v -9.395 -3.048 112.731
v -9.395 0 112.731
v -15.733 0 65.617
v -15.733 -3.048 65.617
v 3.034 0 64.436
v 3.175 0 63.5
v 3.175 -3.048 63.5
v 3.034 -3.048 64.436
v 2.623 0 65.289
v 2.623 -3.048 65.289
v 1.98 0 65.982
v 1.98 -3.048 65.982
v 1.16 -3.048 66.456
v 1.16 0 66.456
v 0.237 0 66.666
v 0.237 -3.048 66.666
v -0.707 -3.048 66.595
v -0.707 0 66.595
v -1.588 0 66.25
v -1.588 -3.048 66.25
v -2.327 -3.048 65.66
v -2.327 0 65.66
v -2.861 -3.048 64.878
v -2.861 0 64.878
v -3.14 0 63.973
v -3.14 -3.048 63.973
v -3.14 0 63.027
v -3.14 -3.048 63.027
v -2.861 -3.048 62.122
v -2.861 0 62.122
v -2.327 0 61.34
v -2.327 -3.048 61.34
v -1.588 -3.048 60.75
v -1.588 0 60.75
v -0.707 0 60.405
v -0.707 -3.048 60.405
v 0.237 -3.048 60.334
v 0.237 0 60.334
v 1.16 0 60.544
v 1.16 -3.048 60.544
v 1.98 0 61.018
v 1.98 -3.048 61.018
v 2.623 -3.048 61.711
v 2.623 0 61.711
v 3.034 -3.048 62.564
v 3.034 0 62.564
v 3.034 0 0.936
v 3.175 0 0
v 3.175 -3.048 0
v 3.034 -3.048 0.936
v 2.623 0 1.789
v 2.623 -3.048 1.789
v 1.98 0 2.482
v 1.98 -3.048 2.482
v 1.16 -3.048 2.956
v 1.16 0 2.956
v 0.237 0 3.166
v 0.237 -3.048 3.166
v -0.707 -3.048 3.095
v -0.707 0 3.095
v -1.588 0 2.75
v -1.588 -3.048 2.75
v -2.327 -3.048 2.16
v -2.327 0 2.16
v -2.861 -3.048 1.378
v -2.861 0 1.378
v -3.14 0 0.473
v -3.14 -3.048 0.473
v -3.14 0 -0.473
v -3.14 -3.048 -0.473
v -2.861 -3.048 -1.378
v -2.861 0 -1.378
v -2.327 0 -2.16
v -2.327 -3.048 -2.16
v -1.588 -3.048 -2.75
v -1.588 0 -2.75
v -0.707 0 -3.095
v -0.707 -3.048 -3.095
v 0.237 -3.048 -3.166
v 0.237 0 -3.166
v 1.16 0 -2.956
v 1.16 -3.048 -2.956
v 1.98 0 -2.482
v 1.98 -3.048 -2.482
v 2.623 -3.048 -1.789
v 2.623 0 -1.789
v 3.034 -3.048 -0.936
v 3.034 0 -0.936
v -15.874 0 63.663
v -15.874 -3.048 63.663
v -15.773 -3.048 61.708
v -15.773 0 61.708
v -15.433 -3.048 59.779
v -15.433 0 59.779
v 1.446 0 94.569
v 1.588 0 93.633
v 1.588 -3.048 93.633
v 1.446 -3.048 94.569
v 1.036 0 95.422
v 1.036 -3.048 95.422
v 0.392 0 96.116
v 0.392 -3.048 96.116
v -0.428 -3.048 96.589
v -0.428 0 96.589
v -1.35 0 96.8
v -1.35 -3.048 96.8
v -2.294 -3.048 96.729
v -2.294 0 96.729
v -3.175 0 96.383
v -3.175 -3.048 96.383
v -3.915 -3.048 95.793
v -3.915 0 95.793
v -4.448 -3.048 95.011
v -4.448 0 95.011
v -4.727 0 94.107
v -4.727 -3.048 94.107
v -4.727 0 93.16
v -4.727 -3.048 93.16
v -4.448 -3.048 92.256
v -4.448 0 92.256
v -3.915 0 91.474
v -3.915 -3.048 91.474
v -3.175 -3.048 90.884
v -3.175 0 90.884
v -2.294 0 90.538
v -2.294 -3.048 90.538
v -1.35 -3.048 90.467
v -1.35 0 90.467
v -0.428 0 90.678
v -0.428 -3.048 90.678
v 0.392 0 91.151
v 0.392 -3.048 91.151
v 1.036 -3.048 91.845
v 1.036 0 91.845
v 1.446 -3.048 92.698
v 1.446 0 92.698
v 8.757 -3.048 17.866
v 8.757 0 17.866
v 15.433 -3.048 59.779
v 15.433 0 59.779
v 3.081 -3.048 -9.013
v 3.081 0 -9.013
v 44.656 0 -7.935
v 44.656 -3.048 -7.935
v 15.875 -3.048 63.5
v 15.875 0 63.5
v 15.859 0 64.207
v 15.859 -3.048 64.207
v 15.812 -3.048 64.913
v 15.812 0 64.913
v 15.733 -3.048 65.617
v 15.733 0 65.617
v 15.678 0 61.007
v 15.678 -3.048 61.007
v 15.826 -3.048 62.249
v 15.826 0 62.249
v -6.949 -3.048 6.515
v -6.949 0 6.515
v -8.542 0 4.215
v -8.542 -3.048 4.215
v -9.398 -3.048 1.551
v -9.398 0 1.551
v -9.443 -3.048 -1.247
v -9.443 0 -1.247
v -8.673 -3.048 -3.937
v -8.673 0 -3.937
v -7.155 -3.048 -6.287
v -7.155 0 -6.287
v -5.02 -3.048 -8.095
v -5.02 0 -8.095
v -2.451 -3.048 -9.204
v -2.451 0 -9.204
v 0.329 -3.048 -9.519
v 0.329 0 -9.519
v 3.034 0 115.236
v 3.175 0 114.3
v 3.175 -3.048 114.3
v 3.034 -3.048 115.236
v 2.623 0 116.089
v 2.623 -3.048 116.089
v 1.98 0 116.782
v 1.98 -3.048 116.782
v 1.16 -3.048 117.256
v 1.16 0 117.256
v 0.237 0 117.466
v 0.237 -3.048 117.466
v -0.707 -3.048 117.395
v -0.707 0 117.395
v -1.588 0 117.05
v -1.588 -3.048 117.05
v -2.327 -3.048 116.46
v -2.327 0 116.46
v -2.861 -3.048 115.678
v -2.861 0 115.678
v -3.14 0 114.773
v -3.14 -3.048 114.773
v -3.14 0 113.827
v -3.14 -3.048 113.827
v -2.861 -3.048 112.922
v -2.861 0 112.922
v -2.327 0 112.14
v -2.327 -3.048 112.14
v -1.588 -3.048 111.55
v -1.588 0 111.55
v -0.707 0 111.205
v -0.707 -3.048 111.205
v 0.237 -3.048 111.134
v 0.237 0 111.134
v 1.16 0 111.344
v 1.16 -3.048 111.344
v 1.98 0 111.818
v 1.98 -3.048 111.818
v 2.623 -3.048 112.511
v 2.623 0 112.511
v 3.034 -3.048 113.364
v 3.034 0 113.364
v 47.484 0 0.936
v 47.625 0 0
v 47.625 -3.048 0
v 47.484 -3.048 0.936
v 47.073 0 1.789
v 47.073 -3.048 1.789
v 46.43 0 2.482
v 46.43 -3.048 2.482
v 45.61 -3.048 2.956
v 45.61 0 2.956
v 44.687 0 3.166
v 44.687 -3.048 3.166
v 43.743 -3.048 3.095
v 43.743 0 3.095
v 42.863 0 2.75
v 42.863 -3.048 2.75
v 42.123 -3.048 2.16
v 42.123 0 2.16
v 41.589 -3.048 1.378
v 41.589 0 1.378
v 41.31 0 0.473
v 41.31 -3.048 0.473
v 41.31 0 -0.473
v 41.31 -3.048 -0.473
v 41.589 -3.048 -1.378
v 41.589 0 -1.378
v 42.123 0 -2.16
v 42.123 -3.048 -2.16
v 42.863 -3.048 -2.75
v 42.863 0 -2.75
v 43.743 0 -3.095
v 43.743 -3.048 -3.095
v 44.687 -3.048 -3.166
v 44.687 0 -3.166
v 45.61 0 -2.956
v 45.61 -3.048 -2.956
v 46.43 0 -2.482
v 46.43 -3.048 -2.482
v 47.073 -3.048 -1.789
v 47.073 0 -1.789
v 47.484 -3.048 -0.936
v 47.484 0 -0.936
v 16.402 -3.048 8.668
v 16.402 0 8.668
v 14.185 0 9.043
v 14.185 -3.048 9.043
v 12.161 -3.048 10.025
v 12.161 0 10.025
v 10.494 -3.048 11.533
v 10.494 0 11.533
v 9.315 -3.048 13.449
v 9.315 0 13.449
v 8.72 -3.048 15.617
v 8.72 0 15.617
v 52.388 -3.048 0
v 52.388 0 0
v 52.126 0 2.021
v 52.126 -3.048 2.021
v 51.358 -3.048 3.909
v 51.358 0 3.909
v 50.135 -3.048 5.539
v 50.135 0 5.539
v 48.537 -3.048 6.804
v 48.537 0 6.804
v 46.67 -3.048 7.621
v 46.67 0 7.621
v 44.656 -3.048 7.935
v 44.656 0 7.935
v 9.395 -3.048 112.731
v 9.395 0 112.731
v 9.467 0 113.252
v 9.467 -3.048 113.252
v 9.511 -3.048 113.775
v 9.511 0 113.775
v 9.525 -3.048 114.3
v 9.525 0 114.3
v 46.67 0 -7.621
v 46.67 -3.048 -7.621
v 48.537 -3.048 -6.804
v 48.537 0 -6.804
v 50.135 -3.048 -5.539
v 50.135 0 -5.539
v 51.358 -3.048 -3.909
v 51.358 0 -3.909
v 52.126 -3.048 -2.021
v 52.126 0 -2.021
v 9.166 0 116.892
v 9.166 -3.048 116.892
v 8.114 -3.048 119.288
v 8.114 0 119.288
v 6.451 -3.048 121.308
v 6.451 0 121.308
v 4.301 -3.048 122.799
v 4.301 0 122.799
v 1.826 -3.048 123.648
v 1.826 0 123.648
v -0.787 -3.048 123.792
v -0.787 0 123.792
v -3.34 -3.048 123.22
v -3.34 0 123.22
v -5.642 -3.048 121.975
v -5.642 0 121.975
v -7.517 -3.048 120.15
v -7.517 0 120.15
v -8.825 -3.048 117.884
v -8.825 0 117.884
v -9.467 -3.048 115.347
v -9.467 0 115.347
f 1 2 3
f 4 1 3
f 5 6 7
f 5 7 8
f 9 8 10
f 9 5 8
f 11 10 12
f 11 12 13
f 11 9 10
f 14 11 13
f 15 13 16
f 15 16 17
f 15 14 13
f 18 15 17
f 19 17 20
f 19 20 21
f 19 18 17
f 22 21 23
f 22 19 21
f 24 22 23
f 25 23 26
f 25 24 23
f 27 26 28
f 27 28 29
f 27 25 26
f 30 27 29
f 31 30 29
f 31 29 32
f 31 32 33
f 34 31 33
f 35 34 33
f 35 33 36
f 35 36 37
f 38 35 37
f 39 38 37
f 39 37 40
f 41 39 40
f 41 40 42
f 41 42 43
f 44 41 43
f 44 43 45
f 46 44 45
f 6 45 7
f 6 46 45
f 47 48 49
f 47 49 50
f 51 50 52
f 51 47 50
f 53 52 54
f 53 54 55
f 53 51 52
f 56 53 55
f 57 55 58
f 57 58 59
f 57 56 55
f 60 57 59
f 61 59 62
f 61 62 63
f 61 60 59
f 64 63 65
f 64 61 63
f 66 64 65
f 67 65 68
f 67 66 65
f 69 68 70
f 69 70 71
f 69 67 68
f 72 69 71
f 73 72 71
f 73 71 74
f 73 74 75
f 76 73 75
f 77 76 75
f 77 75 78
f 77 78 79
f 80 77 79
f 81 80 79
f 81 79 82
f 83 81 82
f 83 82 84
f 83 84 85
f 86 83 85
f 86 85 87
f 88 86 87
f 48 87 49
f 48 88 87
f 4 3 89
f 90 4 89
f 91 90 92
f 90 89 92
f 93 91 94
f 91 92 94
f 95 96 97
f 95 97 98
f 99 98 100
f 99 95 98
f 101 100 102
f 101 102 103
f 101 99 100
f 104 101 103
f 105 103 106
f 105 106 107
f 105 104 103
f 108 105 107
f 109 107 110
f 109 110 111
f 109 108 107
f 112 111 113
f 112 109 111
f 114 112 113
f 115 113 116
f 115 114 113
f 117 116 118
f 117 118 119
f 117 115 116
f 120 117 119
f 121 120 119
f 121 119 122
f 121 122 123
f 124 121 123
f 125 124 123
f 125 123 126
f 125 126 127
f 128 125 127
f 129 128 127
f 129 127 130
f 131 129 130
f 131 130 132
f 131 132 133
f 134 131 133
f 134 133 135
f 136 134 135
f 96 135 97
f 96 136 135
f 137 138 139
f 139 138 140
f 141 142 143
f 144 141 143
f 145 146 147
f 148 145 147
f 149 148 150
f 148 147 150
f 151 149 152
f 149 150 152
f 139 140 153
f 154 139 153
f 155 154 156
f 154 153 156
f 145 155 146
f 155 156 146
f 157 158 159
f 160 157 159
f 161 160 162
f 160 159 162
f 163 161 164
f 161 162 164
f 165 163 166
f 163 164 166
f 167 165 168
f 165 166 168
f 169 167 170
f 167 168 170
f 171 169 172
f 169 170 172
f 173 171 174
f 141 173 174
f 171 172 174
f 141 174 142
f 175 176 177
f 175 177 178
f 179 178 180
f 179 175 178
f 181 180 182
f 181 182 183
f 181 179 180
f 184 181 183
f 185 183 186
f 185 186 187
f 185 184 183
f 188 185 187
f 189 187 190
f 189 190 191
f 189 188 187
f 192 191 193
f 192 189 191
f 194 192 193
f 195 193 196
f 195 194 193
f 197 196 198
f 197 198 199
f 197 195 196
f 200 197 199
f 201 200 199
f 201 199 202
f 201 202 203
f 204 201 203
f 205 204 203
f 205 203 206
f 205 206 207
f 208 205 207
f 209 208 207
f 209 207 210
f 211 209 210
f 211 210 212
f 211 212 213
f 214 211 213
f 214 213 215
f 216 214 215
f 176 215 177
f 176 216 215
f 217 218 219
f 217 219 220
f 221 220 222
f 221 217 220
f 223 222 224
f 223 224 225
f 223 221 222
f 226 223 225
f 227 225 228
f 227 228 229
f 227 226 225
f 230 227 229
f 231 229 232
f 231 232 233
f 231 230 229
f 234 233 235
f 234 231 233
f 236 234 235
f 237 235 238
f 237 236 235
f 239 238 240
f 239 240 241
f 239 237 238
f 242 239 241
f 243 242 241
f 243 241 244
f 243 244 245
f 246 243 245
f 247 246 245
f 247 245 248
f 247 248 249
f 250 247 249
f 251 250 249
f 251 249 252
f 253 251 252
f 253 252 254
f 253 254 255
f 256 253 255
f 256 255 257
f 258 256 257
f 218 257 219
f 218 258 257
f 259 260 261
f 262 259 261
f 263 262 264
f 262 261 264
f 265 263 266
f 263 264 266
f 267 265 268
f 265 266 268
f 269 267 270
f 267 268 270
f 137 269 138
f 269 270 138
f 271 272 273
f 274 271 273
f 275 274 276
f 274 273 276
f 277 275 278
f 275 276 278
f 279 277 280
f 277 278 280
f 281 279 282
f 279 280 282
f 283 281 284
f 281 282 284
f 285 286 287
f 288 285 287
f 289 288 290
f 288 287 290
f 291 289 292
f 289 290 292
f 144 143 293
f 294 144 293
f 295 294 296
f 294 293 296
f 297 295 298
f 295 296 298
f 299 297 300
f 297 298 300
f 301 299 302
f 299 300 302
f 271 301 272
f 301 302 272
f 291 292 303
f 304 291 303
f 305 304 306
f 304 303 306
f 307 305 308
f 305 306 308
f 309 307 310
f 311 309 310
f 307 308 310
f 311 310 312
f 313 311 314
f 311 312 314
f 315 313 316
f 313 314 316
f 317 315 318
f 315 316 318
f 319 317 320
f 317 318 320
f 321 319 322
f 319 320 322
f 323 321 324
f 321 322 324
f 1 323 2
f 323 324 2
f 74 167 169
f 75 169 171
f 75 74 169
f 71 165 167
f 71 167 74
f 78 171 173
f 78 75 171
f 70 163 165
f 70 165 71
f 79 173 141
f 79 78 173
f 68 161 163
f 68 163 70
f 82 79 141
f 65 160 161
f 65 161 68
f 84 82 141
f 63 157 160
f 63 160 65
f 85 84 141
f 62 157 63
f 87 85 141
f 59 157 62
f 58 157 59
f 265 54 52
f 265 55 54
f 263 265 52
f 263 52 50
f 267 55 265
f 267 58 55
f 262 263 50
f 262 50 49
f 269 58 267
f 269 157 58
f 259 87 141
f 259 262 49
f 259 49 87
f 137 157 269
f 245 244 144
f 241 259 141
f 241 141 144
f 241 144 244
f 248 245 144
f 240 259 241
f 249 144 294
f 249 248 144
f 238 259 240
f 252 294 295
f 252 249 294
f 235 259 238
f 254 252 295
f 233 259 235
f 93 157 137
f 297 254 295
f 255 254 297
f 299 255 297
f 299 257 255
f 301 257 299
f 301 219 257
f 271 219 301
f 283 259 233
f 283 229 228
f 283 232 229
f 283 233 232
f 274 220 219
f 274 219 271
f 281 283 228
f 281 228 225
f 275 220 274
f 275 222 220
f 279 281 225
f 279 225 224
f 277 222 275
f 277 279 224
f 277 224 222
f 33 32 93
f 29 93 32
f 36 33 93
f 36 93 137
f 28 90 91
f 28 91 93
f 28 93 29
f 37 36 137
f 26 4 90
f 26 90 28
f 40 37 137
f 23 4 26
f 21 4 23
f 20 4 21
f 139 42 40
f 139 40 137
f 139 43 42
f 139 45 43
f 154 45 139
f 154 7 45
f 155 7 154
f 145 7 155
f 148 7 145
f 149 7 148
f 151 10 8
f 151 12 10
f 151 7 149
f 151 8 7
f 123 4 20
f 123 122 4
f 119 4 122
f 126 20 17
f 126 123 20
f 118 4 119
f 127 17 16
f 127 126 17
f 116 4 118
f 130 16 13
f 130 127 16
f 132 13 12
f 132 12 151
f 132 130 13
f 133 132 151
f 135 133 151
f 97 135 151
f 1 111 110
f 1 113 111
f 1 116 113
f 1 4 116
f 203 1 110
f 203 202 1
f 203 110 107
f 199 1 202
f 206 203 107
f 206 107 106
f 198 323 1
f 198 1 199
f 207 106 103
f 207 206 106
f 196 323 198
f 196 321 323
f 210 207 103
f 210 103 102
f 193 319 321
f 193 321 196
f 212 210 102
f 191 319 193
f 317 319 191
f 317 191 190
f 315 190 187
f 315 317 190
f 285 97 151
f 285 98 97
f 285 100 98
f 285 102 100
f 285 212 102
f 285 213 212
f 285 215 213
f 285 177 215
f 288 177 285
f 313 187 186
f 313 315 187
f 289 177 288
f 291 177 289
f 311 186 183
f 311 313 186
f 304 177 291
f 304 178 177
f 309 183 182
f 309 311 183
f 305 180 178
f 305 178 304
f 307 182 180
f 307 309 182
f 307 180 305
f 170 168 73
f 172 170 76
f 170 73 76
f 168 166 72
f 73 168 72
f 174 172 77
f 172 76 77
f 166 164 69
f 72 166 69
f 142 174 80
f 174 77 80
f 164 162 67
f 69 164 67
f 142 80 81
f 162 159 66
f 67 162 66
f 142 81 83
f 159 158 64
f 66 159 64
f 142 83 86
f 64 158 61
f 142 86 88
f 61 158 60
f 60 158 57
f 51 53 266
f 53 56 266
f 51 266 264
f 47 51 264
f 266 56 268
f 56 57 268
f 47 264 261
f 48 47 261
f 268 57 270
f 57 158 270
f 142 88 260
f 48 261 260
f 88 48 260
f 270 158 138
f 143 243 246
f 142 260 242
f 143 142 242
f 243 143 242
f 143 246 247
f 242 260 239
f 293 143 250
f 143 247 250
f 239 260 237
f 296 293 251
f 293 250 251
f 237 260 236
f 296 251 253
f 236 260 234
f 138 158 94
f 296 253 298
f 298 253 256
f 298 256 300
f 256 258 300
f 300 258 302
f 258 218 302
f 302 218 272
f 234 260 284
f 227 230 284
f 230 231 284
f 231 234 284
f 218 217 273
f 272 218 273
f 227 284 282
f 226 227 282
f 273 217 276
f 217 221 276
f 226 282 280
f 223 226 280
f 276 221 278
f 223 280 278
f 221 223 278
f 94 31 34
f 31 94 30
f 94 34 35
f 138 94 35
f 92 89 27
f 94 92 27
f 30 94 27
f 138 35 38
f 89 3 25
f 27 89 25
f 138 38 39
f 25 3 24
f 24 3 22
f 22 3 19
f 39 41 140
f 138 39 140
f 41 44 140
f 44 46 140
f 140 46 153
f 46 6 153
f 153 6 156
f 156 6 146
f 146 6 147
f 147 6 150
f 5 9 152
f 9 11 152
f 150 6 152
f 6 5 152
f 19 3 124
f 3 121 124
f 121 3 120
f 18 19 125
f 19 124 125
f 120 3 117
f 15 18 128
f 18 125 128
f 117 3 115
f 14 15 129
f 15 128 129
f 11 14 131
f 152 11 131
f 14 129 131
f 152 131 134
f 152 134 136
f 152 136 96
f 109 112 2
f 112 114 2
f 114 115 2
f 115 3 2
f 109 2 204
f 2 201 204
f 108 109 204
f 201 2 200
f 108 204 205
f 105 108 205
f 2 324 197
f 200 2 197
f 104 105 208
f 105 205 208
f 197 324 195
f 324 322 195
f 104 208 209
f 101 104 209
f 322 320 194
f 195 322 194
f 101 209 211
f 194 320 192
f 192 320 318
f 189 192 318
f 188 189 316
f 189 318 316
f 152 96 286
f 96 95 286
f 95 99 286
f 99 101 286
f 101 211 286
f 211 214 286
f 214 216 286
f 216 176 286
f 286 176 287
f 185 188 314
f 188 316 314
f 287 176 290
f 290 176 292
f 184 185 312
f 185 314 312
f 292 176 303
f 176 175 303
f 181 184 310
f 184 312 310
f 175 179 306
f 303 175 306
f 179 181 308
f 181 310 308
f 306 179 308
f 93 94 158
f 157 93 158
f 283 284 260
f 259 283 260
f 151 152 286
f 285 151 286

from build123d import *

# Parameters (mm, degrees)
F0_R     = 3.175
F1_DEPTH = 3.048


with BuildPart() as f1:
    # F0 (on Front) → F1 (new body)
    with BuildSketch(Plane.XZ):
        with BuildLine():
            ThreePointArc((9.394944, 112.731355), (9.49243, 113.512986), (9.525, 114.3))
            ThreePointArc((9.525, 114.3), (-0.787014, 123.79243), (-9.394944, 112.731355))
            ThreePointArc((-9.394944, 112.731355), (0, 104.775), (9.394944, 112.731355))
        make_face()
        with Locations((0, 114.3)):
            Circle(F0_R, mode=Mode.SUBTRACT)
        with BuildLine():
            ThreePointArc((9.394944, 112.731355), (0, 104.775), (-9.394944, 112.731355))
            Line((-9.394944, 112.731355), (-15.733267, 65.616587))
            ThreePointArc((-15.733267, 65.616587), (0, 79.375), (15.733267, 65.616587))
            Line((15.733267, 65.616587), (9.394944, 112.731355))
        make_face()
        with Locations((-1.5875, 93.633412)):
            Circle(F0_R, mode=Mode.SUBTRACT)
        with BuildLine():
            ThreePointArc((15.733267, 65.616587), (0, 79.375), (-15.733267, 65.616587))
            ThreePointArc((-15.733267, 65.616587), (-15.854012, 62.683953), (-15.432802, 59.779214))
            ThreePointArc((-15.432802, 59.779214), (0, 47.625), (15.432802, 59.779214))
            ThreePointArc((15.432802, 59.779214), (15.764063, 61.626515), (15.875, 63.5))
            ThreePointArc((15.875, 63.5), (15.839527, 64.560664), (15.733267, 65.616587))
        make_face()
        with Locations((0, 63.5)):
            Circle(F0_R, mode=Mode.SUBTRACT)
        with BuildLine():
            ThreePointArc((15.432802, 59.779214), (0, 47.625), (-15.432802, 59.779214))
            Line((-15.432802, 59.779214), (-6.94853, 6.514872))
            ThreePointArc((-6.94853, 6.514872), (3.502919, 8.857493), (9.525, 0))
            ThreePointArc((9.525, 0), (7.748219, -5.539921), (3.080754, -9.013023))
            Line((3.080754, -9.013023), (44.655779, -7.934832))
            ThreePointArc((44.655779, -7.934832), (36.5125, 0), (44.655779, 7.934832))
            Line((44.655779, 7.934832), (16.401671, 8.667563))
            ThreePointArc((16.401671, 8.667563), (10.493739, 11.533341), (8.756557, 17.865682))
            Line((8.756557, 17.865682), (15.432802, 59.779214))
        make_face()
        with BuildLine():
            ThreePointArc((9.525, 0), (3.502919, 8.857493), (-6.94853, 6.514872))
            ThreePointArc((-6.94853, 6.514872), (-8.001175, -5.167864), (3.080754, -9.013023))
            ThreePointArc((3.080754, -9.013023), (7.748219, -5.539921), (9.525, 0))
        make_face()
        Circle(F0_R, mode=Mode.SUBTRACT)
        with BuildLine():
            ThreePointArc((44.655779, 7.934832), (36.5125, 0), (44.655779, -7.934832))
            ThreePointArc((44.655779, -7.934832), (50.134948, -5.539429), (52.3875, 0))
            ThreePointArc((52.3875, 0), (50.134948, 5.539429), (44.655779, 7.934832))
        make_face()
        with Locations((44.45, 0)):
            Circle(F0_R, mode=Mode.SUBTRACT)
    extrude(amount=F1_DEPTH)


solid = f1.part
